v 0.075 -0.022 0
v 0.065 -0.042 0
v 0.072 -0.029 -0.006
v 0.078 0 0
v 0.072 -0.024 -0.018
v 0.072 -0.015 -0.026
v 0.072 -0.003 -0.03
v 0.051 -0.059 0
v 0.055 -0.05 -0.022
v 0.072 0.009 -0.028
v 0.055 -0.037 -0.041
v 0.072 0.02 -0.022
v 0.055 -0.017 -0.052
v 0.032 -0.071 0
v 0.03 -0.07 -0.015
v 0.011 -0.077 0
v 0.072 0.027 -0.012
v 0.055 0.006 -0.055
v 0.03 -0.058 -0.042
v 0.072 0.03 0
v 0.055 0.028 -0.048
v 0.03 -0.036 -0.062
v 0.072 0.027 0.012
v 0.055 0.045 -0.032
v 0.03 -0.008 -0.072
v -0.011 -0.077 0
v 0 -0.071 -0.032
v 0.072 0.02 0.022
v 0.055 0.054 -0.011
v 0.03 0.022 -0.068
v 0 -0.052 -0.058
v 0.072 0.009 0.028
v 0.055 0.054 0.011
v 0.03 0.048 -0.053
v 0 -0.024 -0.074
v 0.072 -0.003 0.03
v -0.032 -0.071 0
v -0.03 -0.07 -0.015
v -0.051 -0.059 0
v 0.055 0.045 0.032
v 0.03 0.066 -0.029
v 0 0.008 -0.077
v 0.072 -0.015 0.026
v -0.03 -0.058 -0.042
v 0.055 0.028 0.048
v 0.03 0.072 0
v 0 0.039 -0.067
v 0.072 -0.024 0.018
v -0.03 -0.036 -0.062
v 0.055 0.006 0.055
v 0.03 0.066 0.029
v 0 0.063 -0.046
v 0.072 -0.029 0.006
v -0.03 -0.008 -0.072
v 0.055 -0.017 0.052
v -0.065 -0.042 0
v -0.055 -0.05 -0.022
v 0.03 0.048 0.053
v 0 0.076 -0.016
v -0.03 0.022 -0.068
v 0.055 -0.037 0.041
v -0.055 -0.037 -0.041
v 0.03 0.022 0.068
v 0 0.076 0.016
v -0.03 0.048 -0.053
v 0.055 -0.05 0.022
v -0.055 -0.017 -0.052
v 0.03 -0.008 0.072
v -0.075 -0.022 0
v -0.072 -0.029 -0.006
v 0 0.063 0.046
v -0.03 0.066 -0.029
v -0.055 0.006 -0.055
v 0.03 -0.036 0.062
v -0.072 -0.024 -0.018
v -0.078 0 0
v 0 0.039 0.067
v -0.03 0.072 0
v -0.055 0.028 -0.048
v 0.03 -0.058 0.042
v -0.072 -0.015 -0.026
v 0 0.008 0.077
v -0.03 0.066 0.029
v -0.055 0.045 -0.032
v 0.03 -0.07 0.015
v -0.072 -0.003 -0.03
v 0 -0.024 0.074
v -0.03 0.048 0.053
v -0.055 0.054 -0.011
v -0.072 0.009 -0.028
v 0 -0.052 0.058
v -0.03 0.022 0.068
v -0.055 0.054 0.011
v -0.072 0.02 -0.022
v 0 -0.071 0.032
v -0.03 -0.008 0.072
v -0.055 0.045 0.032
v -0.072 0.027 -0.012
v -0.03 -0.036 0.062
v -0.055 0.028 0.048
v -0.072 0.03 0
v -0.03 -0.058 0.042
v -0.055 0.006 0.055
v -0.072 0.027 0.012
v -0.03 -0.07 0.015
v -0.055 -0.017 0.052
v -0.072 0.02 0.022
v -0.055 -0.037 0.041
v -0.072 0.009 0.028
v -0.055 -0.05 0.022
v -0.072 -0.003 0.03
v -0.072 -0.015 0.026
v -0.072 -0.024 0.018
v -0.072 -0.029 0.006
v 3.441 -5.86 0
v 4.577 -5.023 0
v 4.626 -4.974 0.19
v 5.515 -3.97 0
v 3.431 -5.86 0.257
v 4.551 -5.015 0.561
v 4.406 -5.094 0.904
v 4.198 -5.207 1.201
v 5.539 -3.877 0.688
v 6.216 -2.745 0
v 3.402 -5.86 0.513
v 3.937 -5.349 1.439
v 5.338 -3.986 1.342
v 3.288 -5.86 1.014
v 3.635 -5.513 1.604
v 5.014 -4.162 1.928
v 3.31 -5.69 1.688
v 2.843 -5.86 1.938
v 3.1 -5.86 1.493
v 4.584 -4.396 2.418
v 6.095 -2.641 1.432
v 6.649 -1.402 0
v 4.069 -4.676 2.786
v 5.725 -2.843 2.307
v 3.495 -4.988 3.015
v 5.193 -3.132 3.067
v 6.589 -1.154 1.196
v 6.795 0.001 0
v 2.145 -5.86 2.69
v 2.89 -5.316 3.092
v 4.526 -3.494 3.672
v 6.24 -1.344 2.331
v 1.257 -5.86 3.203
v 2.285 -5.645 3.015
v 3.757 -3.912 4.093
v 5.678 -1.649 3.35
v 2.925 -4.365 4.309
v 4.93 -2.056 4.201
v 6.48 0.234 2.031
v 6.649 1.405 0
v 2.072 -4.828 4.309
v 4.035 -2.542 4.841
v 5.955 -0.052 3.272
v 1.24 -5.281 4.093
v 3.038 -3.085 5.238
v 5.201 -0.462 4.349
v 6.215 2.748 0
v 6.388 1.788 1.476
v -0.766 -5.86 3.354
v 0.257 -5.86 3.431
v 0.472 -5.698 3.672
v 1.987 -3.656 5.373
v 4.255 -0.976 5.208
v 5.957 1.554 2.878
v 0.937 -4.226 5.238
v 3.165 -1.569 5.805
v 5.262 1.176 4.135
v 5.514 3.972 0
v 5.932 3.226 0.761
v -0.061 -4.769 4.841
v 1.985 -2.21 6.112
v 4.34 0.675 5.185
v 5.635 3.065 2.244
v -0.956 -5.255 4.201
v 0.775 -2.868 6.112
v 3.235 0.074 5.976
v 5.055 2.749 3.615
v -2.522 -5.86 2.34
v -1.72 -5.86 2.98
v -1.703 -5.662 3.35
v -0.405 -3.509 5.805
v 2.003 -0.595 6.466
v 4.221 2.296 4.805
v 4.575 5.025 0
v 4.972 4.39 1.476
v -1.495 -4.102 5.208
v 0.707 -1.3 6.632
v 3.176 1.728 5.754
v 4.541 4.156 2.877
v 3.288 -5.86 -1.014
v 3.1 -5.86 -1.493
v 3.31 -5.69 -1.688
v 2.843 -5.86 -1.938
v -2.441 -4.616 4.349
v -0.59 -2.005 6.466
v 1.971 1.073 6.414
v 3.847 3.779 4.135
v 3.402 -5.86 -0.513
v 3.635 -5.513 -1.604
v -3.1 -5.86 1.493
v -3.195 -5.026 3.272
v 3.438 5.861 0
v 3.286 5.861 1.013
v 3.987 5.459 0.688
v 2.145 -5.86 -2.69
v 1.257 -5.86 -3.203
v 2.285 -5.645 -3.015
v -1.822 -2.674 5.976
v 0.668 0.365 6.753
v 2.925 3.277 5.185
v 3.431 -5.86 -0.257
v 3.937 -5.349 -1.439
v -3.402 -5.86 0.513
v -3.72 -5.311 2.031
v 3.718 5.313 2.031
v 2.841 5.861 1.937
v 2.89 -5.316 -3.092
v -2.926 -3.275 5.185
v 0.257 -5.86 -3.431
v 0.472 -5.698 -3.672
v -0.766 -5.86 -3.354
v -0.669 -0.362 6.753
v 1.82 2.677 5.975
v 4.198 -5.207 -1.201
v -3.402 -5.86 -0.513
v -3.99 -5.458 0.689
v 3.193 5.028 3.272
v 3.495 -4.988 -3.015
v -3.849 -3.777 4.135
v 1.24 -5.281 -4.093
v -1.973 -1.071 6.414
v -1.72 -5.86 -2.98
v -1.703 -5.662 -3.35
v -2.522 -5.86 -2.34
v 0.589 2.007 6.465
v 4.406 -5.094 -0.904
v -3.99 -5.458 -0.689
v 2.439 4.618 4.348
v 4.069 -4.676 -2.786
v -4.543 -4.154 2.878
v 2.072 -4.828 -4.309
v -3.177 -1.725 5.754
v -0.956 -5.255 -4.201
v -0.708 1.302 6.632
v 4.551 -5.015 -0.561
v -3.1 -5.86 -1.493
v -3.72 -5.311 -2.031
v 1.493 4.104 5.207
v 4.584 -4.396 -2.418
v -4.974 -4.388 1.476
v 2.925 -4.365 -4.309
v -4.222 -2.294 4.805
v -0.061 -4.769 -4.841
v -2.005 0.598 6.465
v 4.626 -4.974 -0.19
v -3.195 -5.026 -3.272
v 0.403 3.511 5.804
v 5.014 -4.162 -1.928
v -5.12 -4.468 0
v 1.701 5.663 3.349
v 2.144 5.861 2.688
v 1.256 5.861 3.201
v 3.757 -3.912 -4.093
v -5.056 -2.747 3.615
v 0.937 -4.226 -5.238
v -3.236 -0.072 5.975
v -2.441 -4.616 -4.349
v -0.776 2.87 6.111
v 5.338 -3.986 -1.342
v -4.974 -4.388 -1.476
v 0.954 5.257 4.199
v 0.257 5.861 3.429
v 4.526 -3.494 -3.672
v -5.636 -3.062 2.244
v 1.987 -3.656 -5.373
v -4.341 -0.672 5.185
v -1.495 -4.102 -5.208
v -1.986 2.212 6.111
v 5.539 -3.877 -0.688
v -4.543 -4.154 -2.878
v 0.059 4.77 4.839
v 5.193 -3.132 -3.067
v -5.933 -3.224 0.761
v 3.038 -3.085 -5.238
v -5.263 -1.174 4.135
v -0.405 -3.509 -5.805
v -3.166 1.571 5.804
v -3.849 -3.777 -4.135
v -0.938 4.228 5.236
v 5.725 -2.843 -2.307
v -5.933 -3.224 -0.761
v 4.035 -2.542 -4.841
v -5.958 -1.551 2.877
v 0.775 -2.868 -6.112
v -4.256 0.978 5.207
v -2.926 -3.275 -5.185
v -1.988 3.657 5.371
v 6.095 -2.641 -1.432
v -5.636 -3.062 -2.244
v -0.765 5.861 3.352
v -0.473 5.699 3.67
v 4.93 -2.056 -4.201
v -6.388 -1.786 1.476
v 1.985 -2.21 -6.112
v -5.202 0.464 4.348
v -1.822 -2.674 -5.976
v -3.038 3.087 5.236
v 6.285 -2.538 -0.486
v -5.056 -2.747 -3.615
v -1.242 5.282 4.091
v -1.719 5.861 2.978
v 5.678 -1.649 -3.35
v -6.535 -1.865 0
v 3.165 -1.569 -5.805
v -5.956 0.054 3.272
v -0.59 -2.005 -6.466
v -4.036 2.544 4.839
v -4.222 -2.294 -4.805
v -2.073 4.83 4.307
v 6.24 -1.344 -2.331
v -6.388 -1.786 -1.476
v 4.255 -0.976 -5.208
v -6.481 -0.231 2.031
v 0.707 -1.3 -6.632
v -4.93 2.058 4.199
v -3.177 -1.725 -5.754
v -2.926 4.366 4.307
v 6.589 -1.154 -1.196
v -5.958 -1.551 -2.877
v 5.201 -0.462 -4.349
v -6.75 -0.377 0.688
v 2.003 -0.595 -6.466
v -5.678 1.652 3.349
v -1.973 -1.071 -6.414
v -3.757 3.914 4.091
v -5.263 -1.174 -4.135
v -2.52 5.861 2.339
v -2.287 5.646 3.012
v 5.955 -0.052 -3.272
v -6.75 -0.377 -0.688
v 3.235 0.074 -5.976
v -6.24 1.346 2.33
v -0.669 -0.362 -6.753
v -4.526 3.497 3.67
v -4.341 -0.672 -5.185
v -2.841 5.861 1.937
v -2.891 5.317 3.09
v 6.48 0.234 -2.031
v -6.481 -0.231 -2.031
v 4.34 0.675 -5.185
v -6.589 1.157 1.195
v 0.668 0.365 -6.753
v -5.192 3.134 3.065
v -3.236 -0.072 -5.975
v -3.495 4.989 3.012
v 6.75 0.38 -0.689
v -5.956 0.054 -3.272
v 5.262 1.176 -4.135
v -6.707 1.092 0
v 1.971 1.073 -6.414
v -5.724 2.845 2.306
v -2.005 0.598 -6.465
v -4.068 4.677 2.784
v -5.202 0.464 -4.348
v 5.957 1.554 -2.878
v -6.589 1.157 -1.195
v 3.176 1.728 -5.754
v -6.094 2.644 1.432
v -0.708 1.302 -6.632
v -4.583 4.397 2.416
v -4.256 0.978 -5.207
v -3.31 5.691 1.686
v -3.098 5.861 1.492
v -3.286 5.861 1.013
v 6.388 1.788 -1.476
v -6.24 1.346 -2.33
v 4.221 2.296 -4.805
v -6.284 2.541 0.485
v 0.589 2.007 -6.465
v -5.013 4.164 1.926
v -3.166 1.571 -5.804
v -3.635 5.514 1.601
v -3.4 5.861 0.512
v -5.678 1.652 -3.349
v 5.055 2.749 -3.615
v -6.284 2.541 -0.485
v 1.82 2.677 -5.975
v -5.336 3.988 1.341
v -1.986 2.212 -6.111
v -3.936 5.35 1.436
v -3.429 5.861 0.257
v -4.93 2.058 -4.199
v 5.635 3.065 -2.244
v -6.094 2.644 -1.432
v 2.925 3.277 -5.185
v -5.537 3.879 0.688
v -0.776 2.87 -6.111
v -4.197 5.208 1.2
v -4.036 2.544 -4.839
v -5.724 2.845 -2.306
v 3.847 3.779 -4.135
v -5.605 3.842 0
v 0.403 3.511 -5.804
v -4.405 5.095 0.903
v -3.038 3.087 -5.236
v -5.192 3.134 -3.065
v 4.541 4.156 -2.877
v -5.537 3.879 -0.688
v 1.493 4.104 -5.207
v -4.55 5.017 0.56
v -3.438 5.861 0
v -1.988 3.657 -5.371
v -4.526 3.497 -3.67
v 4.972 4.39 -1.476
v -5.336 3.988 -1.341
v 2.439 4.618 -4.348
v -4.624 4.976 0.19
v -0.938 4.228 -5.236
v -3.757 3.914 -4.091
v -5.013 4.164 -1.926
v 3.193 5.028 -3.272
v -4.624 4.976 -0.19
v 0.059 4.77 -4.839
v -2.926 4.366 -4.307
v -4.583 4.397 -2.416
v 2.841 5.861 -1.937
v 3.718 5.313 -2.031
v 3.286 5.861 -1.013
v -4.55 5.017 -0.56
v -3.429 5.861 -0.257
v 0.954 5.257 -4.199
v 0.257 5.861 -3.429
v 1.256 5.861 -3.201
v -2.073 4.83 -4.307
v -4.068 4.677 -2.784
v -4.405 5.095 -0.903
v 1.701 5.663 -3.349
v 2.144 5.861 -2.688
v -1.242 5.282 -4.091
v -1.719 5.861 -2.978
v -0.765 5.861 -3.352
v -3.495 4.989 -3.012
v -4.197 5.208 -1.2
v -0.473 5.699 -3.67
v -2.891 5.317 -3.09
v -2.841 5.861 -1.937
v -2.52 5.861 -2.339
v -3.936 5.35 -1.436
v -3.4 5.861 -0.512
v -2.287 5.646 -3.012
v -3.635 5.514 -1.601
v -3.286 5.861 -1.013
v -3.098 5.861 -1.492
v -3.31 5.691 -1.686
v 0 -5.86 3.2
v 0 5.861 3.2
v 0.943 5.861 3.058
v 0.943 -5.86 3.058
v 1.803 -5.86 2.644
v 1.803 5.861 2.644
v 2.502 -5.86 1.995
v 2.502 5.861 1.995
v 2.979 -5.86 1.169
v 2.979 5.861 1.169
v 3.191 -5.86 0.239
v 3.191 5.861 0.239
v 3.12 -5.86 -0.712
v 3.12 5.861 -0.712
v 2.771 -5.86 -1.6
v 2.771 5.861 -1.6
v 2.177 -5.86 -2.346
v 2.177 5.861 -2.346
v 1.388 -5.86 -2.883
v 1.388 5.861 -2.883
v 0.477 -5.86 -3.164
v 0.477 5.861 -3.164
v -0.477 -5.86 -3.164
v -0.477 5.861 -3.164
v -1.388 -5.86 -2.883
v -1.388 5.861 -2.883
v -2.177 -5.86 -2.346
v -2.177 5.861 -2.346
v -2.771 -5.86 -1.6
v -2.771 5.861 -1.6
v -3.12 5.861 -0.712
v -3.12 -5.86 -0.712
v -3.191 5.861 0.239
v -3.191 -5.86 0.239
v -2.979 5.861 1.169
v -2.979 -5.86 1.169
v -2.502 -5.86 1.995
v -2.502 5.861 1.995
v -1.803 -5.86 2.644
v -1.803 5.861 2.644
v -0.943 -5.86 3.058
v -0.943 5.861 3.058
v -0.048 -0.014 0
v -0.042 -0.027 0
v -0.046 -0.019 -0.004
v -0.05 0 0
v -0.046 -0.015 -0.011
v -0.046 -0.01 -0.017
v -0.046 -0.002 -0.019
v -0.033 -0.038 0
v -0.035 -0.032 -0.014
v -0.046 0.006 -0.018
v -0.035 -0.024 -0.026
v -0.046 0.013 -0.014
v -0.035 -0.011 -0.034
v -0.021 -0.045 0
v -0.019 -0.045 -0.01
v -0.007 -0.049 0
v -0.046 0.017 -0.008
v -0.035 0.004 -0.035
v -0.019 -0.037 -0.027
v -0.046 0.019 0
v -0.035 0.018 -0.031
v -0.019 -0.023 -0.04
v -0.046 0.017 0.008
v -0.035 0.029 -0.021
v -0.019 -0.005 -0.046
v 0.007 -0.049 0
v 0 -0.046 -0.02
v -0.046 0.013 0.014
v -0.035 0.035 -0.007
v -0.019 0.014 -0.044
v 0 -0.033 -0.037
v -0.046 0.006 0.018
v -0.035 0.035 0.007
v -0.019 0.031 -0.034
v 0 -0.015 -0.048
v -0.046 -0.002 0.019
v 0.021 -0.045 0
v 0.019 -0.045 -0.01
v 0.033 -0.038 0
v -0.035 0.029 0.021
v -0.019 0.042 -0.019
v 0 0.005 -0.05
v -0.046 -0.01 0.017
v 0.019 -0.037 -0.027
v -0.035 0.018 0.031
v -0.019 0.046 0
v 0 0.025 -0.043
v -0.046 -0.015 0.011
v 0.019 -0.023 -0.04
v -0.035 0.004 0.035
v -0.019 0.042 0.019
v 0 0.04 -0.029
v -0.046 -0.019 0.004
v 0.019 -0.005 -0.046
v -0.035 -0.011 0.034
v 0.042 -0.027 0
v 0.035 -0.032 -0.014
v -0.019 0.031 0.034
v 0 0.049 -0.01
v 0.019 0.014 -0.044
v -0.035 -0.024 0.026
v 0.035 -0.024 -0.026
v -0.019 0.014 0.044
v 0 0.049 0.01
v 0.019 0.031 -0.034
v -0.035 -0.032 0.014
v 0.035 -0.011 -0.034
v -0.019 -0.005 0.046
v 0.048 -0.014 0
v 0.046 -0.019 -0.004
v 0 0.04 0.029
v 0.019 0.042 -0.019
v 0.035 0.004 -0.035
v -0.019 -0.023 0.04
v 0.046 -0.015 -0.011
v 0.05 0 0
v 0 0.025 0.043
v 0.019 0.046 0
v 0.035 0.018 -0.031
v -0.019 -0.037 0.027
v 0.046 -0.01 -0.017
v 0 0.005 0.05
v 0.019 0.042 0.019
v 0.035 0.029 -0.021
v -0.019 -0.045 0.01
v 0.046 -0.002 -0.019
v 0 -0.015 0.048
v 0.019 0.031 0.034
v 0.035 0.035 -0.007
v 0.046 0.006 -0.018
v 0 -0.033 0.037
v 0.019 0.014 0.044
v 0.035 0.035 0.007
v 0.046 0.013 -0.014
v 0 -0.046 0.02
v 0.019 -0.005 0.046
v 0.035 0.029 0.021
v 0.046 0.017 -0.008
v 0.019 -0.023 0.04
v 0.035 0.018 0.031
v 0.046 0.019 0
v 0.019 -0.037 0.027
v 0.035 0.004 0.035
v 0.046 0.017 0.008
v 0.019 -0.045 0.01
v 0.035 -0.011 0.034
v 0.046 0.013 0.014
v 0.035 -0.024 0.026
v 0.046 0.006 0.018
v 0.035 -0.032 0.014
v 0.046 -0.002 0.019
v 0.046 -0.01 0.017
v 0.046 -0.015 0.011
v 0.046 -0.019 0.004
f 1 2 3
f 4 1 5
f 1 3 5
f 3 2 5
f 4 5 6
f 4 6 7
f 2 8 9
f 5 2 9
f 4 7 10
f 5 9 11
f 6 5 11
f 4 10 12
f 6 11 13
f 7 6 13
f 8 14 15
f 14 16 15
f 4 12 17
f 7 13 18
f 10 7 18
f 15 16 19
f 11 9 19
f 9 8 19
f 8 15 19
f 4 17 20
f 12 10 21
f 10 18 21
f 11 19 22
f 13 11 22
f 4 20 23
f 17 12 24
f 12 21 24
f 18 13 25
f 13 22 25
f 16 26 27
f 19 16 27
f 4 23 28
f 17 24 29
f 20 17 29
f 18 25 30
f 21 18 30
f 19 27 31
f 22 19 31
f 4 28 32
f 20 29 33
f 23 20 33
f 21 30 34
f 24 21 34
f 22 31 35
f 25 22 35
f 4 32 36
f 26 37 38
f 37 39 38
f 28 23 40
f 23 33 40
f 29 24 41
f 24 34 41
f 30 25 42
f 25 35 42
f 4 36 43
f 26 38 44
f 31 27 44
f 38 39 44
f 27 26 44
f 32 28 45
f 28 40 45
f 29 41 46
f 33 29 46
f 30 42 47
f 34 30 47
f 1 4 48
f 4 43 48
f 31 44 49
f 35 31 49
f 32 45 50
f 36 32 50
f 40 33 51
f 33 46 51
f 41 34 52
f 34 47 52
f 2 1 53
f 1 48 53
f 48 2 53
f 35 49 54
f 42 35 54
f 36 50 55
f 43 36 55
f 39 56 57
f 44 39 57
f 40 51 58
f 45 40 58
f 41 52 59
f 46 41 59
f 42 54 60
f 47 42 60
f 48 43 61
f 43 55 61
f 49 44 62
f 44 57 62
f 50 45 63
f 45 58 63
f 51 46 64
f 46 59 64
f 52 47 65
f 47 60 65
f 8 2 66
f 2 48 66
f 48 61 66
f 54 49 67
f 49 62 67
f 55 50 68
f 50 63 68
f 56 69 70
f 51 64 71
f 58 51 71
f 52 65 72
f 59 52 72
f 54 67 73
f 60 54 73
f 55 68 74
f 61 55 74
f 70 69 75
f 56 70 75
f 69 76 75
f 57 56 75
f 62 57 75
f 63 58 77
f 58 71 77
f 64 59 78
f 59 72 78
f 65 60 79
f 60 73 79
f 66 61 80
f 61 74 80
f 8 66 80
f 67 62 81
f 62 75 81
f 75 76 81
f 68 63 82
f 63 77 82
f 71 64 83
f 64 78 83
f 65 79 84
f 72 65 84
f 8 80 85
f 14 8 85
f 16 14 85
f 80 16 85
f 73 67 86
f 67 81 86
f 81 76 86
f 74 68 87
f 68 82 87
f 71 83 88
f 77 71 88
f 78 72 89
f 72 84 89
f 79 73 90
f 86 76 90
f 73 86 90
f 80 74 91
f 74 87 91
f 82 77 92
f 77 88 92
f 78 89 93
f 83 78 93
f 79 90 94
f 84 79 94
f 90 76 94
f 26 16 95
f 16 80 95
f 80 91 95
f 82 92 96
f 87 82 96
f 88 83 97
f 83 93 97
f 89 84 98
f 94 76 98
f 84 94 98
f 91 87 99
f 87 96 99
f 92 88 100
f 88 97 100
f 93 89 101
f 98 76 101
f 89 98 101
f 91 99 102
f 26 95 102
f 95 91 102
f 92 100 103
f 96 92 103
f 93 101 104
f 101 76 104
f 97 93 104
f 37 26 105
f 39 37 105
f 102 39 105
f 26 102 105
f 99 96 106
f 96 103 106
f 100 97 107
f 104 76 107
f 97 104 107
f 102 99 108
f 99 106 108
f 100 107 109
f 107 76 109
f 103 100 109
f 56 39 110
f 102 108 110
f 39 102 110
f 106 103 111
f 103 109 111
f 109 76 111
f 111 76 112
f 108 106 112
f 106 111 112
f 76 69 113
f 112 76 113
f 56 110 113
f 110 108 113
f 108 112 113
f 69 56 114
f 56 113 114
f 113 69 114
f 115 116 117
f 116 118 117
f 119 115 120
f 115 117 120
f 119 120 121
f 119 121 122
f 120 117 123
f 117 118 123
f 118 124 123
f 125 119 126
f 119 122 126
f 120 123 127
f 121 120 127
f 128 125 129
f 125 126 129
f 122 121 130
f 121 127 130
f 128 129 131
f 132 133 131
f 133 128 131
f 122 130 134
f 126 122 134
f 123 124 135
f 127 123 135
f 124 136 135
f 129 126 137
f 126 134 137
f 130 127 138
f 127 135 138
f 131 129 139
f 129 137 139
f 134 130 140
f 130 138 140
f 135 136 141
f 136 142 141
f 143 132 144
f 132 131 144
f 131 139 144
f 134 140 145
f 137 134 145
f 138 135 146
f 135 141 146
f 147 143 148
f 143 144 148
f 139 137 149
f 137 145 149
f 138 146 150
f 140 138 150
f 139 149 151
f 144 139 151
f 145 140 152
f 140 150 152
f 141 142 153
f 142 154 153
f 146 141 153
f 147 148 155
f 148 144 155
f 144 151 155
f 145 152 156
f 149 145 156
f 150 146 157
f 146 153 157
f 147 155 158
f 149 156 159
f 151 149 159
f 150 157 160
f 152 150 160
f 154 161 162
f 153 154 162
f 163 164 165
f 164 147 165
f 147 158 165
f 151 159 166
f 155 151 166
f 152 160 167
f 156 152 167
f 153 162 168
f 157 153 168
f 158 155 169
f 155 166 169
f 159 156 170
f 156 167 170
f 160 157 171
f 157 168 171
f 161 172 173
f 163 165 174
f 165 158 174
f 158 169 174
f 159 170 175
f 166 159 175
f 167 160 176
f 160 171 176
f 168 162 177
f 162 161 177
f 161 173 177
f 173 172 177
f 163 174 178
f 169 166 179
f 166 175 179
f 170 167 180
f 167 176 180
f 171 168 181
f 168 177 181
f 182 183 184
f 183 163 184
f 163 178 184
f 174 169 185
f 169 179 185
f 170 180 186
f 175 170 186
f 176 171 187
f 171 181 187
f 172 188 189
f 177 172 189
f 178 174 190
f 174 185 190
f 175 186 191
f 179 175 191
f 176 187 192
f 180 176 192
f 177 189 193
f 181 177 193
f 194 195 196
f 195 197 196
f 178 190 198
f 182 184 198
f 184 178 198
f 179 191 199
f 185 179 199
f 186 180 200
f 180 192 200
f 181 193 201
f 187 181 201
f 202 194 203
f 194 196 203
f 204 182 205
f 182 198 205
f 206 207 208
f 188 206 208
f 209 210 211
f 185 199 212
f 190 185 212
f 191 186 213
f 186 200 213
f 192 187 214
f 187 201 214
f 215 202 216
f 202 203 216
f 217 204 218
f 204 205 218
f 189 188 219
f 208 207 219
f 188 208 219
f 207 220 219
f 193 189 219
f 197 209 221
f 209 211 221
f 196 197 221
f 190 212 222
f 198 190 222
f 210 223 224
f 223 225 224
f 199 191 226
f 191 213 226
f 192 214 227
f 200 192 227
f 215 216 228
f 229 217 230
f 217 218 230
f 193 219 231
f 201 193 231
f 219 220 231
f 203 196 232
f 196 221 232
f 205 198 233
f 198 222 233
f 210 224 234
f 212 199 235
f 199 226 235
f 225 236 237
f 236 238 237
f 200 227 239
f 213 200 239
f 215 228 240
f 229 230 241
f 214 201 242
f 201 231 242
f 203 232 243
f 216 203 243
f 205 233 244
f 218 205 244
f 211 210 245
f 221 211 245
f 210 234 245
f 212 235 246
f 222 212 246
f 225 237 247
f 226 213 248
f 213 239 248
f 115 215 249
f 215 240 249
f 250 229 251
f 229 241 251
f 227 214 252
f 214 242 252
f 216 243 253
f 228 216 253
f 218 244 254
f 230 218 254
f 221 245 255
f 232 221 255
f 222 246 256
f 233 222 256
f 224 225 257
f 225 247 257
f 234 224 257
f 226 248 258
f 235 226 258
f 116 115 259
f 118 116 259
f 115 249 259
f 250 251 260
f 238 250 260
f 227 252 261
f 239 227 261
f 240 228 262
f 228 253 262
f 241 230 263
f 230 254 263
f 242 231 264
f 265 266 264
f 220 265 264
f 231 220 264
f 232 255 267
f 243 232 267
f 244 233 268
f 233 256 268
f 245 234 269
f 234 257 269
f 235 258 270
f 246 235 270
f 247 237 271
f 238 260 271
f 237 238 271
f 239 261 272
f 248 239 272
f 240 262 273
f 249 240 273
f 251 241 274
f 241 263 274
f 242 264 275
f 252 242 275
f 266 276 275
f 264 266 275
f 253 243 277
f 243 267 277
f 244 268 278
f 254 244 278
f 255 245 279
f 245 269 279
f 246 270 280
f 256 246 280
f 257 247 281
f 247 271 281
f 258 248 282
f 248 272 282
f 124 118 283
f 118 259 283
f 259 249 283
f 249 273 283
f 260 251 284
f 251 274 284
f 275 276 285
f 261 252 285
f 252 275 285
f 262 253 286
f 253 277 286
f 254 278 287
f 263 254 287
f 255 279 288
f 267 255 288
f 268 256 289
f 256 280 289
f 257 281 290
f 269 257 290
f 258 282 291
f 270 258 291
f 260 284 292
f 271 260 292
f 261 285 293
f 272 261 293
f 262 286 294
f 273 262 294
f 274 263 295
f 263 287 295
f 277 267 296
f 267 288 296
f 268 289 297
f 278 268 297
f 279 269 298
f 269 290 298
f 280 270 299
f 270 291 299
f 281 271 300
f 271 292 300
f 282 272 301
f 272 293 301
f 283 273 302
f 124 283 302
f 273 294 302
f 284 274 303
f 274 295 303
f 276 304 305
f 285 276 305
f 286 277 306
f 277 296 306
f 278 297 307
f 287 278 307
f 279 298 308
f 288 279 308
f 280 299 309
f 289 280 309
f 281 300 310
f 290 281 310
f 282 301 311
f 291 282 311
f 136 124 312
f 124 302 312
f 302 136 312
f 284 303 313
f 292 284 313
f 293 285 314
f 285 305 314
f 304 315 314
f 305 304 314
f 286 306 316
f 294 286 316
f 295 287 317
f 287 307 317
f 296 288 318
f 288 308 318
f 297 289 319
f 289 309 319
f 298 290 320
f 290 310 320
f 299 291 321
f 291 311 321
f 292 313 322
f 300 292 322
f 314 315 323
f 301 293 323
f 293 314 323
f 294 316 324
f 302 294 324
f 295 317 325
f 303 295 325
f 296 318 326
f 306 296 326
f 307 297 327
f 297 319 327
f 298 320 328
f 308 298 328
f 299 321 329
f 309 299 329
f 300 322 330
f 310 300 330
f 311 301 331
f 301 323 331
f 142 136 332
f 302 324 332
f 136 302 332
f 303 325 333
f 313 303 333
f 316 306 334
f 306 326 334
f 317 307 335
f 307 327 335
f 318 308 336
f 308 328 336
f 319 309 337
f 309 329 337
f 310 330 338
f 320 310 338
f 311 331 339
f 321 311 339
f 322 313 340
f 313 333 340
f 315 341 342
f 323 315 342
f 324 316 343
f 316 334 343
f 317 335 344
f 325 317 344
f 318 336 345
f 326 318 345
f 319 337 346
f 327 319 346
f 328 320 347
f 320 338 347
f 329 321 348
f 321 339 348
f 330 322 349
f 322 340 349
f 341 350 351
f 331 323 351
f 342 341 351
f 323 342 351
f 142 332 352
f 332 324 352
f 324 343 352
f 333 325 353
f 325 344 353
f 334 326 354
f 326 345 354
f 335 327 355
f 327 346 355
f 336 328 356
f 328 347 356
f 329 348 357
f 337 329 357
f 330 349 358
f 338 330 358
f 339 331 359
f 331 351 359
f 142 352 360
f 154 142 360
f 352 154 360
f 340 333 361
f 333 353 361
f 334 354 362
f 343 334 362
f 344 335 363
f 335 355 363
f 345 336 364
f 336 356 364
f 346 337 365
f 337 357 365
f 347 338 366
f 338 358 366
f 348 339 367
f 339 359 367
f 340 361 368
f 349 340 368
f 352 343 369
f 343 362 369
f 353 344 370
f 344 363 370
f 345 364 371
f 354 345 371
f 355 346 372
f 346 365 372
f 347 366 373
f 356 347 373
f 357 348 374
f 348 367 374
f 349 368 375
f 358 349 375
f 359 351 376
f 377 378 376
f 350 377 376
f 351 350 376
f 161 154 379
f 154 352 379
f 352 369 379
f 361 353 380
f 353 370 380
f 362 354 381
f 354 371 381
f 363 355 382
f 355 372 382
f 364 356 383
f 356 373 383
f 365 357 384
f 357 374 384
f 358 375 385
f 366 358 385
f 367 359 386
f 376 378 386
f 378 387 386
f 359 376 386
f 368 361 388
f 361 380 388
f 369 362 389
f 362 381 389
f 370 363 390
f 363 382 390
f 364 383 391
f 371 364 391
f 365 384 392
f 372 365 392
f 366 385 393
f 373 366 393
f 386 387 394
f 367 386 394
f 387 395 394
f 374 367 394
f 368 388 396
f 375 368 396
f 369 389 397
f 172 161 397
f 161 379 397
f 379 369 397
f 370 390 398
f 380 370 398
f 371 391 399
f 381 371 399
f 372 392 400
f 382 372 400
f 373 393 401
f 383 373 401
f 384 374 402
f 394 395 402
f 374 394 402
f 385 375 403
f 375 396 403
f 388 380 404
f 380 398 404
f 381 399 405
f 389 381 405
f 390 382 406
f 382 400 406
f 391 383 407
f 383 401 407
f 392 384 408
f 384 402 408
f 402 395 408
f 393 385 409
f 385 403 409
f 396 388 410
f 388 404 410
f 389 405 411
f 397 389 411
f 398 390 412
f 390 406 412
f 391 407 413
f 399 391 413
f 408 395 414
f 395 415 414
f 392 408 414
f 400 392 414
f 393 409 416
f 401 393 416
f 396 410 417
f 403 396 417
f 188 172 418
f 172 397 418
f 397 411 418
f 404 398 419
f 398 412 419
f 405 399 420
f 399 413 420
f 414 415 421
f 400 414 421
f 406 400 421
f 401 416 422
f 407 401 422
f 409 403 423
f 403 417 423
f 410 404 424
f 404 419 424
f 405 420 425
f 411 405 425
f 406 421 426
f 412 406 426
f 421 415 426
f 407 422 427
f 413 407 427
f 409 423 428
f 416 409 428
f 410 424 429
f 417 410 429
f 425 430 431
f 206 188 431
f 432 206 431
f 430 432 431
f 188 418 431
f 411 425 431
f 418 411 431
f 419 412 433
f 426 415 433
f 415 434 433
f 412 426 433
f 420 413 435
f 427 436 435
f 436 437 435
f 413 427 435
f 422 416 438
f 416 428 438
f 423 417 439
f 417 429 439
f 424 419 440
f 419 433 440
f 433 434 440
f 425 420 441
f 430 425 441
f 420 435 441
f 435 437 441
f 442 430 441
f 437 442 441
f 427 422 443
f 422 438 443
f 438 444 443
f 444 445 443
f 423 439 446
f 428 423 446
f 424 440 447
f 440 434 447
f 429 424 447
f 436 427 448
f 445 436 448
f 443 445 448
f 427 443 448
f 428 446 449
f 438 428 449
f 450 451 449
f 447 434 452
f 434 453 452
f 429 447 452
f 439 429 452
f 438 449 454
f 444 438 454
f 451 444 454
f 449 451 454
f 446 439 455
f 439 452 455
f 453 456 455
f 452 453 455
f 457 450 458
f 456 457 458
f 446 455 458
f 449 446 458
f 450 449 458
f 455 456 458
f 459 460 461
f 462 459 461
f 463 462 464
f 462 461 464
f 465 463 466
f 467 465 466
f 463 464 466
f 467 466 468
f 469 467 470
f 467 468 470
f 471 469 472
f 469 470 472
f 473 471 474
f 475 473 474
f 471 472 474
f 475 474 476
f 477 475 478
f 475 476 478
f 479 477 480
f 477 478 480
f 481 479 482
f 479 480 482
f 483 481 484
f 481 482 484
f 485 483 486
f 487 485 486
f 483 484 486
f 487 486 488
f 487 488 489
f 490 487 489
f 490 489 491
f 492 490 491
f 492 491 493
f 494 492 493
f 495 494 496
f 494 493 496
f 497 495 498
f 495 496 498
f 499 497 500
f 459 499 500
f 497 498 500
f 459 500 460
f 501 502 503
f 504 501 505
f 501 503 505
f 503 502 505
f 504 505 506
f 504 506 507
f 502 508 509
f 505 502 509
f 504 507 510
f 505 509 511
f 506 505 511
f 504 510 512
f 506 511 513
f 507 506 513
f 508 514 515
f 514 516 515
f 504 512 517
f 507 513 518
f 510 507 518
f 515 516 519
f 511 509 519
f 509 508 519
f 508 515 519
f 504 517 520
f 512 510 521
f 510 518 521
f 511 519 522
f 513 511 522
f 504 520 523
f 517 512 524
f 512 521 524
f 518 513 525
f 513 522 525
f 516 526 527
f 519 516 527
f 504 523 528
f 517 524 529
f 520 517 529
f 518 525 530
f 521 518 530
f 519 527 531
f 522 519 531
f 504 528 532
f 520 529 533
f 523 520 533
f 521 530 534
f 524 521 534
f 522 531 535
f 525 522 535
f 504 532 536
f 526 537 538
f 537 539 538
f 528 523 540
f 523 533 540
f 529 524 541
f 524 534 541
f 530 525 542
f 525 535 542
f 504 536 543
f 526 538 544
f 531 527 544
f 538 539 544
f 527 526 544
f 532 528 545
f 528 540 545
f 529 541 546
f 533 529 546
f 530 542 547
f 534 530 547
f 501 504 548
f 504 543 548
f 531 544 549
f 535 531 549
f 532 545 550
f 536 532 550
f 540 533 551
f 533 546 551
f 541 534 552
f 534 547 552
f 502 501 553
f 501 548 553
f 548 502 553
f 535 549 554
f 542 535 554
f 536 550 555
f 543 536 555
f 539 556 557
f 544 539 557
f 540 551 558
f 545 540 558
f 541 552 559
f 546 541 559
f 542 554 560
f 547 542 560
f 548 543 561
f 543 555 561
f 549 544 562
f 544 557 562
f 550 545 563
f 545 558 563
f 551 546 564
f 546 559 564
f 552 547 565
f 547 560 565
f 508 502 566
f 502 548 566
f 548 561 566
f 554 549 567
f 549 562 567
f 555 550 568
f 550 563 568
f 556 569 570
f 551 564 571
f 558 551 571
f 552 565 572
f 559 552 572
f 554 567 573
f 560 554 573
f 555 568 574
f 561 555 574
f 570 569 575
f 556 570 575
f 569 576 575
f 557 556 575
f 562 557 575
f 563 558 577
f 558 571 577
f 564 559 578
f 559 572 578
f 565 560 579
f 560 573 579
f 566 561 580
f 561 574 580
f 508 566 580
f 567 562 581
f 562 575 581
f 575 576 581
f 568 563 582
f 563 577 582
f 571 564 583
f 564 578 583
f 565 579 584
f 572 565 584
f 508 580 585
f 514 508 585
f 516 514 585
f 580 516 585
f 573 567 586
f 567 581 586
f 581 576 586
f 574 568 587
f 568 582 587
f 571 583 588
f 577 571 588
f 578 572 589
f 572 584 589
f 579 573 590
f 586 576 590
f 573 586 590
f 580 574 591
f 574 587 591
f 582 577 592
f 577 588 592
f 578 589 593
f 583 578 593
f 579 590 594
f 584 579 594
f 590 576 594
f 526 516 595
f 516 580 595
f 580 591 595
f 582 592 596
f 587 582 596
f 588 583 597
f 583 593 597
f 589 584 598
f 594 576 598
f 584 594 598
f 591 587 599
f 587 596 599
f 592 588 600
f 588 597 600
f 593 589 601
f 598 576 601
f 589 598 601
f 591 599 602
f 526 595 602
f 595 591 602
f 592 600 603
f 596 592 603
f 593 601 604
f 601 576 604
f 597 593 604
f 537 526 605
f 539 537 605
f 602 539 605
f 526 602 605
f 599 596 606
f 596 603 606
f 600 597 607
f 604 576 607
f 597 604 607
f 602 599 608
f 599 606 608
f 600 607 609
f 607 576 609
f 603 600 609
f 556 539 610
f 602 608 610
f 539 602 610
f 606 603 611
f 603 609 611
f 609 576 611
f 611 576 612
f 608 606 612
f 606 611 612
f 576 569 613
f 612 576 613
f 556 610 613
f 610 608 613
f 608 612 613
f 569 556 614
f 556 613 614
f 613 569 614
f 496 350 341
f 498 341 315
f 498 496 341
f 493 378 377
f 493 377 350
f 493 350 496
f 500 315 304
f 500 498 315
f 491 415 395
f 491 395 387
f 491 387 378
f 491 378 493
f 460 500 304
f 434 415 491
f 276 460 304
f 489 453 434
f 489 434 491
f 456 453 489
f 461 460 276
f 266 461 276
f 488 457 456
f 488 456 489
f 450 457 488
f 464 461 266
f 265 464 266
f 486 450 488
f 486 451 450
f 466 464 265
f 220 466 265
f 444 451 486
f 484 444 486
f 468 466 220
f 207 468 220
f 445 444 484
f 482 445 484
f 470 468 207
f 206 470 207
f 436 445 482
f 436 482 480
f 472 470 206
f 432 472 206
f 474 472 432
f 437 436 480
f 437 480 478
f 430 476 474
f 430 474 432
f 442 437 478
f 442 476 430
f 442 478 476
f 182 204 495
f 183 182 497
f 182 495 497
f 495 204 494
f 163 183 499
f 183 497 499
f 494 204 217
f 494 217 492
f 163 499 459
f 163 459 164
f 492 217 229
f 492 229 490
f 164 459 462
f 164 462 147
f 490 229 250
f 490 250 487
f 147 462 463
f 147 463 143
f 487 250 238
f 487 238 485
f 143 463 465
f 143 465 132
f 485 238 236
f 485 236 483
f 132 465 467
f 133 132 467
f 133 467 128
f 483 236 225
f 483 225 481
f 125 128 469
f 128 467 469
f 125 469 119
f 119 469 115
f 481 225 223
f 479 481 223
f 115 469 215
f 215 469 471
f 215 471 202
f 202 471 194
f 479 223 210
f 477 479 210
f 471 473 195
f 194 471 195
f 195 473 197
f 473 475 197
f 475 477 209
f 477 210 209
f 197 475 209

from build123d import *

# Parameters (mm, degrees)
CUT_EXTRUDE3_DEPTH      = 10
CUT_EXTRUDE3_DEPTH_BACK = 10
SKETCH6_R               = 3.2
CUT_EXTRUDE5_DEPTH      = 11.721374412


with BuildPart() as part:
    # Sketch1 → Revolve1 (revolve)
    with BuildSketch(Plane.XY):
        with BuildLine():
            Line((-3.245502242, 5.970302284), (3.245502242, -5.970302284))
            ThreePointArc((3.245502242, -5.970302284), (5.970302284, 3.245502242), (-3.245502242, 5.970302284))
        make_face()
    revolve(axis=Axis((-3.245502242, 5.970302284, 0), (0.477601103601981, -0.8785767956406371, 0)))

    # Sketch4 → Cut-Extrude3 (cut, two sides: drawn at the far end of the back side and taken through both)
    with BuildSketch(Plane.XY.offset(-CUT_EXTRUDE3_DEPTH_BACK)):
        Polygon((8.159968685, 8.571644262), (-8.716743866, 8.555246622), (-8.716743866, 5.861385957), (8.159968685, 5.861385957), align=None)
        Polygon((0, -8.396596185), (-8.716743866, -8.134988455), (-8.716743866, -5.859988455), (8.159968685, -5.859988455), (8.159968685, -8.396596185), align=None)
    extrude(amount=CUT_EXTRUDE3_DEPTH + CUT_EXTRUDE3_DEPTH_BACK, mode=Mode.SUBTRACT)

    # Sketch6 → Cut-Extrude5 (cut)
    with BuildSketch(Plane(origin=(0, 5.861385957, 0), x_dir=(1, 0, 0), z_dir=(0, 1, 0))):
        with Locations(Location((0, 0, 0), (0, 0, 270))):
            Circle(SKETCH6_R)
    extrude(amount=-CUT_EXTRUDE5_DEPTH, mode=Mode.SUBTRACT)


with BuildPart() as body_2:
    # Sketch7 → Revolve2 (revolve)
    with BuildSketch(Plane.XY):
        with BuildLine():
            Line((0.05, 0), (0.077844983, 0))
            ThreePointArc((0.077844983, 0), (0, -0.077844983), (-0.077844983, 0))
            Line((-0.077844983, 0), (-0.05, 0))
            ThreePointArc((-0.05, 0), (0, -0.05), (0.05, 0))
        make_face()
    revolve(axis=Axis((0, 0, 0), (1, 0, 0)))


solid = Compound([part.part, body_2.part])
